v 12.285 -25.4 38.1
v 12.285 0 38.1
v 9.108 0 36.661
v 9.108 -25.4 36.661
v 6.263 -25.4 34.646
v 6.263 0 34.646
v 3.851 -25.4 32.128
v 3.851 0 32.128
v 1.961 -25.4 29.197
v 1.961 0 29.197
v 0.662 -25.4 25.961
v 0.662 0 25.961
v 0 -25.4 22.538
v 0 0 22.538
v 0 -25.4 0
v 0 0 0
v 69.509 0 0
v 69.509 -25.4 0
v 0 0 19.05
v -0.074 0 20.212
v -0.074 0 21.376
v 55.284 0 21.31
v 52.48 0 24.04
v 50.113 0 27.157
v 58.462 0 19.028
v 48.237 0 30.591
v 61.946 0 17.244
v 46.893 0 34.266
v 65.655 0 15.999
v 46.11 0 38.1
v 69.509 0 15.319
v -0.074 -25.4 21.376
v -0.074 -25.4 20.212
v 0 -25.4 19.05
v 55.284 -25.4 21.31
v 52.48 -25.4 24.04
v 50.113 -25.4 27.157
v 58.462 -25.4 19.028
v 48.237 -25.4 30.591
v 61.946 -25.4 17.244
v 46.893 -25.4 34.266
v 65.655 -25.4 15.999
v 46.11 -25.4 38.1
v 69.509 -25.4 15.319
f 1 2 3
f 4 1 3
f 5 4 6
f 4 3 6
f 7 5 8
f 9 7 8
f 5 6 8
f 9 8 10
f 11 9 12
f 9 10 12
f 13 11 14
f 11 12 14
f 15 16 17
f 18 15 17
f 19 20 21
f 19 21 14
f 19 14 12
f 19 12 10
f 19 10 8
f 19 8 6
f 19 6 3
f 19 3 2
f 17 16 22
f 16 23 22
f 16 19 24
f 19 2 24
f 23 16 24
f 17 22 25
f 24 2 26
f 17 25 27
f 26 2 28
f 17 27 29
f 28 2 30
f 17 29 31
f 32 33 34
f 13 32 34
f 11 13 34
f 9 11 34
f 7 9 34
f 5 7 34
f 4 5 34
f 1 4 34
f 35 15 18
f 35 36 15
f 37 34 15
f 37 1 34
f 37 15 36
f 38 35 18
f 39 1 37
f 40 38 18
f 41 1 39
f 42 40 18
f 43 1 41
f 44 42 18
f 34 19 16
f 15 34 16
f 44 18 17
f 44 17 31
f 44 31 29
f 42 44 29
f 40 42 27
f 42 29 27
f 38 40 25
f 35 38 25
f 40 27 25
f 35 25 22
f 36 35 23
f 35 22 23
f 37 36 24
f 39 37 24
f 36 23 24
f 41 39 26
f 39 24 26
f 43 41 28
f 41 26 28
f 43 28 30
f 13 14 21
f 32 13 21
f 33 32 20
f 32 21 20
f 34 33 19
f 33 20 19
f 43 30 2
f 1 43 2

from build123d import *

# Parameters (mm, degrees)
F1_DEPTH = 25.4


with BuildPart() as f1:
    # F0 (on Front) → F1 (new body)
    with BuildSketch(Plane.XZ):
        with BuildLine():
            ThreePointArc((0, 22.537658), (-0.083312, 20.793829), (0, 19.05))
            Line((0, 19.05), (0, 22.537658))
        make_face()
        with BuildLine():
            Line((0, 19.05), (0, 0))
            Line((0, 0), (69.509163, 0))
            Line((69.509163, 0), (69.509163, 15.319245))
            ThreePointArc((69.509163, 15.319245), (53.830644, 22.622581), (46.110269, 38.1))
            Line((46.110269, 38.1), (12.284626, 38.1))
            ThreePointArc((12.284626, 38.1), (3.850977, 32.127568), (0, 22.537658))
            Line((0, 22.537658), (0, 19.05))
        make_face()
    extrude(amount=F1_DEPTH)


solid = f1.part
